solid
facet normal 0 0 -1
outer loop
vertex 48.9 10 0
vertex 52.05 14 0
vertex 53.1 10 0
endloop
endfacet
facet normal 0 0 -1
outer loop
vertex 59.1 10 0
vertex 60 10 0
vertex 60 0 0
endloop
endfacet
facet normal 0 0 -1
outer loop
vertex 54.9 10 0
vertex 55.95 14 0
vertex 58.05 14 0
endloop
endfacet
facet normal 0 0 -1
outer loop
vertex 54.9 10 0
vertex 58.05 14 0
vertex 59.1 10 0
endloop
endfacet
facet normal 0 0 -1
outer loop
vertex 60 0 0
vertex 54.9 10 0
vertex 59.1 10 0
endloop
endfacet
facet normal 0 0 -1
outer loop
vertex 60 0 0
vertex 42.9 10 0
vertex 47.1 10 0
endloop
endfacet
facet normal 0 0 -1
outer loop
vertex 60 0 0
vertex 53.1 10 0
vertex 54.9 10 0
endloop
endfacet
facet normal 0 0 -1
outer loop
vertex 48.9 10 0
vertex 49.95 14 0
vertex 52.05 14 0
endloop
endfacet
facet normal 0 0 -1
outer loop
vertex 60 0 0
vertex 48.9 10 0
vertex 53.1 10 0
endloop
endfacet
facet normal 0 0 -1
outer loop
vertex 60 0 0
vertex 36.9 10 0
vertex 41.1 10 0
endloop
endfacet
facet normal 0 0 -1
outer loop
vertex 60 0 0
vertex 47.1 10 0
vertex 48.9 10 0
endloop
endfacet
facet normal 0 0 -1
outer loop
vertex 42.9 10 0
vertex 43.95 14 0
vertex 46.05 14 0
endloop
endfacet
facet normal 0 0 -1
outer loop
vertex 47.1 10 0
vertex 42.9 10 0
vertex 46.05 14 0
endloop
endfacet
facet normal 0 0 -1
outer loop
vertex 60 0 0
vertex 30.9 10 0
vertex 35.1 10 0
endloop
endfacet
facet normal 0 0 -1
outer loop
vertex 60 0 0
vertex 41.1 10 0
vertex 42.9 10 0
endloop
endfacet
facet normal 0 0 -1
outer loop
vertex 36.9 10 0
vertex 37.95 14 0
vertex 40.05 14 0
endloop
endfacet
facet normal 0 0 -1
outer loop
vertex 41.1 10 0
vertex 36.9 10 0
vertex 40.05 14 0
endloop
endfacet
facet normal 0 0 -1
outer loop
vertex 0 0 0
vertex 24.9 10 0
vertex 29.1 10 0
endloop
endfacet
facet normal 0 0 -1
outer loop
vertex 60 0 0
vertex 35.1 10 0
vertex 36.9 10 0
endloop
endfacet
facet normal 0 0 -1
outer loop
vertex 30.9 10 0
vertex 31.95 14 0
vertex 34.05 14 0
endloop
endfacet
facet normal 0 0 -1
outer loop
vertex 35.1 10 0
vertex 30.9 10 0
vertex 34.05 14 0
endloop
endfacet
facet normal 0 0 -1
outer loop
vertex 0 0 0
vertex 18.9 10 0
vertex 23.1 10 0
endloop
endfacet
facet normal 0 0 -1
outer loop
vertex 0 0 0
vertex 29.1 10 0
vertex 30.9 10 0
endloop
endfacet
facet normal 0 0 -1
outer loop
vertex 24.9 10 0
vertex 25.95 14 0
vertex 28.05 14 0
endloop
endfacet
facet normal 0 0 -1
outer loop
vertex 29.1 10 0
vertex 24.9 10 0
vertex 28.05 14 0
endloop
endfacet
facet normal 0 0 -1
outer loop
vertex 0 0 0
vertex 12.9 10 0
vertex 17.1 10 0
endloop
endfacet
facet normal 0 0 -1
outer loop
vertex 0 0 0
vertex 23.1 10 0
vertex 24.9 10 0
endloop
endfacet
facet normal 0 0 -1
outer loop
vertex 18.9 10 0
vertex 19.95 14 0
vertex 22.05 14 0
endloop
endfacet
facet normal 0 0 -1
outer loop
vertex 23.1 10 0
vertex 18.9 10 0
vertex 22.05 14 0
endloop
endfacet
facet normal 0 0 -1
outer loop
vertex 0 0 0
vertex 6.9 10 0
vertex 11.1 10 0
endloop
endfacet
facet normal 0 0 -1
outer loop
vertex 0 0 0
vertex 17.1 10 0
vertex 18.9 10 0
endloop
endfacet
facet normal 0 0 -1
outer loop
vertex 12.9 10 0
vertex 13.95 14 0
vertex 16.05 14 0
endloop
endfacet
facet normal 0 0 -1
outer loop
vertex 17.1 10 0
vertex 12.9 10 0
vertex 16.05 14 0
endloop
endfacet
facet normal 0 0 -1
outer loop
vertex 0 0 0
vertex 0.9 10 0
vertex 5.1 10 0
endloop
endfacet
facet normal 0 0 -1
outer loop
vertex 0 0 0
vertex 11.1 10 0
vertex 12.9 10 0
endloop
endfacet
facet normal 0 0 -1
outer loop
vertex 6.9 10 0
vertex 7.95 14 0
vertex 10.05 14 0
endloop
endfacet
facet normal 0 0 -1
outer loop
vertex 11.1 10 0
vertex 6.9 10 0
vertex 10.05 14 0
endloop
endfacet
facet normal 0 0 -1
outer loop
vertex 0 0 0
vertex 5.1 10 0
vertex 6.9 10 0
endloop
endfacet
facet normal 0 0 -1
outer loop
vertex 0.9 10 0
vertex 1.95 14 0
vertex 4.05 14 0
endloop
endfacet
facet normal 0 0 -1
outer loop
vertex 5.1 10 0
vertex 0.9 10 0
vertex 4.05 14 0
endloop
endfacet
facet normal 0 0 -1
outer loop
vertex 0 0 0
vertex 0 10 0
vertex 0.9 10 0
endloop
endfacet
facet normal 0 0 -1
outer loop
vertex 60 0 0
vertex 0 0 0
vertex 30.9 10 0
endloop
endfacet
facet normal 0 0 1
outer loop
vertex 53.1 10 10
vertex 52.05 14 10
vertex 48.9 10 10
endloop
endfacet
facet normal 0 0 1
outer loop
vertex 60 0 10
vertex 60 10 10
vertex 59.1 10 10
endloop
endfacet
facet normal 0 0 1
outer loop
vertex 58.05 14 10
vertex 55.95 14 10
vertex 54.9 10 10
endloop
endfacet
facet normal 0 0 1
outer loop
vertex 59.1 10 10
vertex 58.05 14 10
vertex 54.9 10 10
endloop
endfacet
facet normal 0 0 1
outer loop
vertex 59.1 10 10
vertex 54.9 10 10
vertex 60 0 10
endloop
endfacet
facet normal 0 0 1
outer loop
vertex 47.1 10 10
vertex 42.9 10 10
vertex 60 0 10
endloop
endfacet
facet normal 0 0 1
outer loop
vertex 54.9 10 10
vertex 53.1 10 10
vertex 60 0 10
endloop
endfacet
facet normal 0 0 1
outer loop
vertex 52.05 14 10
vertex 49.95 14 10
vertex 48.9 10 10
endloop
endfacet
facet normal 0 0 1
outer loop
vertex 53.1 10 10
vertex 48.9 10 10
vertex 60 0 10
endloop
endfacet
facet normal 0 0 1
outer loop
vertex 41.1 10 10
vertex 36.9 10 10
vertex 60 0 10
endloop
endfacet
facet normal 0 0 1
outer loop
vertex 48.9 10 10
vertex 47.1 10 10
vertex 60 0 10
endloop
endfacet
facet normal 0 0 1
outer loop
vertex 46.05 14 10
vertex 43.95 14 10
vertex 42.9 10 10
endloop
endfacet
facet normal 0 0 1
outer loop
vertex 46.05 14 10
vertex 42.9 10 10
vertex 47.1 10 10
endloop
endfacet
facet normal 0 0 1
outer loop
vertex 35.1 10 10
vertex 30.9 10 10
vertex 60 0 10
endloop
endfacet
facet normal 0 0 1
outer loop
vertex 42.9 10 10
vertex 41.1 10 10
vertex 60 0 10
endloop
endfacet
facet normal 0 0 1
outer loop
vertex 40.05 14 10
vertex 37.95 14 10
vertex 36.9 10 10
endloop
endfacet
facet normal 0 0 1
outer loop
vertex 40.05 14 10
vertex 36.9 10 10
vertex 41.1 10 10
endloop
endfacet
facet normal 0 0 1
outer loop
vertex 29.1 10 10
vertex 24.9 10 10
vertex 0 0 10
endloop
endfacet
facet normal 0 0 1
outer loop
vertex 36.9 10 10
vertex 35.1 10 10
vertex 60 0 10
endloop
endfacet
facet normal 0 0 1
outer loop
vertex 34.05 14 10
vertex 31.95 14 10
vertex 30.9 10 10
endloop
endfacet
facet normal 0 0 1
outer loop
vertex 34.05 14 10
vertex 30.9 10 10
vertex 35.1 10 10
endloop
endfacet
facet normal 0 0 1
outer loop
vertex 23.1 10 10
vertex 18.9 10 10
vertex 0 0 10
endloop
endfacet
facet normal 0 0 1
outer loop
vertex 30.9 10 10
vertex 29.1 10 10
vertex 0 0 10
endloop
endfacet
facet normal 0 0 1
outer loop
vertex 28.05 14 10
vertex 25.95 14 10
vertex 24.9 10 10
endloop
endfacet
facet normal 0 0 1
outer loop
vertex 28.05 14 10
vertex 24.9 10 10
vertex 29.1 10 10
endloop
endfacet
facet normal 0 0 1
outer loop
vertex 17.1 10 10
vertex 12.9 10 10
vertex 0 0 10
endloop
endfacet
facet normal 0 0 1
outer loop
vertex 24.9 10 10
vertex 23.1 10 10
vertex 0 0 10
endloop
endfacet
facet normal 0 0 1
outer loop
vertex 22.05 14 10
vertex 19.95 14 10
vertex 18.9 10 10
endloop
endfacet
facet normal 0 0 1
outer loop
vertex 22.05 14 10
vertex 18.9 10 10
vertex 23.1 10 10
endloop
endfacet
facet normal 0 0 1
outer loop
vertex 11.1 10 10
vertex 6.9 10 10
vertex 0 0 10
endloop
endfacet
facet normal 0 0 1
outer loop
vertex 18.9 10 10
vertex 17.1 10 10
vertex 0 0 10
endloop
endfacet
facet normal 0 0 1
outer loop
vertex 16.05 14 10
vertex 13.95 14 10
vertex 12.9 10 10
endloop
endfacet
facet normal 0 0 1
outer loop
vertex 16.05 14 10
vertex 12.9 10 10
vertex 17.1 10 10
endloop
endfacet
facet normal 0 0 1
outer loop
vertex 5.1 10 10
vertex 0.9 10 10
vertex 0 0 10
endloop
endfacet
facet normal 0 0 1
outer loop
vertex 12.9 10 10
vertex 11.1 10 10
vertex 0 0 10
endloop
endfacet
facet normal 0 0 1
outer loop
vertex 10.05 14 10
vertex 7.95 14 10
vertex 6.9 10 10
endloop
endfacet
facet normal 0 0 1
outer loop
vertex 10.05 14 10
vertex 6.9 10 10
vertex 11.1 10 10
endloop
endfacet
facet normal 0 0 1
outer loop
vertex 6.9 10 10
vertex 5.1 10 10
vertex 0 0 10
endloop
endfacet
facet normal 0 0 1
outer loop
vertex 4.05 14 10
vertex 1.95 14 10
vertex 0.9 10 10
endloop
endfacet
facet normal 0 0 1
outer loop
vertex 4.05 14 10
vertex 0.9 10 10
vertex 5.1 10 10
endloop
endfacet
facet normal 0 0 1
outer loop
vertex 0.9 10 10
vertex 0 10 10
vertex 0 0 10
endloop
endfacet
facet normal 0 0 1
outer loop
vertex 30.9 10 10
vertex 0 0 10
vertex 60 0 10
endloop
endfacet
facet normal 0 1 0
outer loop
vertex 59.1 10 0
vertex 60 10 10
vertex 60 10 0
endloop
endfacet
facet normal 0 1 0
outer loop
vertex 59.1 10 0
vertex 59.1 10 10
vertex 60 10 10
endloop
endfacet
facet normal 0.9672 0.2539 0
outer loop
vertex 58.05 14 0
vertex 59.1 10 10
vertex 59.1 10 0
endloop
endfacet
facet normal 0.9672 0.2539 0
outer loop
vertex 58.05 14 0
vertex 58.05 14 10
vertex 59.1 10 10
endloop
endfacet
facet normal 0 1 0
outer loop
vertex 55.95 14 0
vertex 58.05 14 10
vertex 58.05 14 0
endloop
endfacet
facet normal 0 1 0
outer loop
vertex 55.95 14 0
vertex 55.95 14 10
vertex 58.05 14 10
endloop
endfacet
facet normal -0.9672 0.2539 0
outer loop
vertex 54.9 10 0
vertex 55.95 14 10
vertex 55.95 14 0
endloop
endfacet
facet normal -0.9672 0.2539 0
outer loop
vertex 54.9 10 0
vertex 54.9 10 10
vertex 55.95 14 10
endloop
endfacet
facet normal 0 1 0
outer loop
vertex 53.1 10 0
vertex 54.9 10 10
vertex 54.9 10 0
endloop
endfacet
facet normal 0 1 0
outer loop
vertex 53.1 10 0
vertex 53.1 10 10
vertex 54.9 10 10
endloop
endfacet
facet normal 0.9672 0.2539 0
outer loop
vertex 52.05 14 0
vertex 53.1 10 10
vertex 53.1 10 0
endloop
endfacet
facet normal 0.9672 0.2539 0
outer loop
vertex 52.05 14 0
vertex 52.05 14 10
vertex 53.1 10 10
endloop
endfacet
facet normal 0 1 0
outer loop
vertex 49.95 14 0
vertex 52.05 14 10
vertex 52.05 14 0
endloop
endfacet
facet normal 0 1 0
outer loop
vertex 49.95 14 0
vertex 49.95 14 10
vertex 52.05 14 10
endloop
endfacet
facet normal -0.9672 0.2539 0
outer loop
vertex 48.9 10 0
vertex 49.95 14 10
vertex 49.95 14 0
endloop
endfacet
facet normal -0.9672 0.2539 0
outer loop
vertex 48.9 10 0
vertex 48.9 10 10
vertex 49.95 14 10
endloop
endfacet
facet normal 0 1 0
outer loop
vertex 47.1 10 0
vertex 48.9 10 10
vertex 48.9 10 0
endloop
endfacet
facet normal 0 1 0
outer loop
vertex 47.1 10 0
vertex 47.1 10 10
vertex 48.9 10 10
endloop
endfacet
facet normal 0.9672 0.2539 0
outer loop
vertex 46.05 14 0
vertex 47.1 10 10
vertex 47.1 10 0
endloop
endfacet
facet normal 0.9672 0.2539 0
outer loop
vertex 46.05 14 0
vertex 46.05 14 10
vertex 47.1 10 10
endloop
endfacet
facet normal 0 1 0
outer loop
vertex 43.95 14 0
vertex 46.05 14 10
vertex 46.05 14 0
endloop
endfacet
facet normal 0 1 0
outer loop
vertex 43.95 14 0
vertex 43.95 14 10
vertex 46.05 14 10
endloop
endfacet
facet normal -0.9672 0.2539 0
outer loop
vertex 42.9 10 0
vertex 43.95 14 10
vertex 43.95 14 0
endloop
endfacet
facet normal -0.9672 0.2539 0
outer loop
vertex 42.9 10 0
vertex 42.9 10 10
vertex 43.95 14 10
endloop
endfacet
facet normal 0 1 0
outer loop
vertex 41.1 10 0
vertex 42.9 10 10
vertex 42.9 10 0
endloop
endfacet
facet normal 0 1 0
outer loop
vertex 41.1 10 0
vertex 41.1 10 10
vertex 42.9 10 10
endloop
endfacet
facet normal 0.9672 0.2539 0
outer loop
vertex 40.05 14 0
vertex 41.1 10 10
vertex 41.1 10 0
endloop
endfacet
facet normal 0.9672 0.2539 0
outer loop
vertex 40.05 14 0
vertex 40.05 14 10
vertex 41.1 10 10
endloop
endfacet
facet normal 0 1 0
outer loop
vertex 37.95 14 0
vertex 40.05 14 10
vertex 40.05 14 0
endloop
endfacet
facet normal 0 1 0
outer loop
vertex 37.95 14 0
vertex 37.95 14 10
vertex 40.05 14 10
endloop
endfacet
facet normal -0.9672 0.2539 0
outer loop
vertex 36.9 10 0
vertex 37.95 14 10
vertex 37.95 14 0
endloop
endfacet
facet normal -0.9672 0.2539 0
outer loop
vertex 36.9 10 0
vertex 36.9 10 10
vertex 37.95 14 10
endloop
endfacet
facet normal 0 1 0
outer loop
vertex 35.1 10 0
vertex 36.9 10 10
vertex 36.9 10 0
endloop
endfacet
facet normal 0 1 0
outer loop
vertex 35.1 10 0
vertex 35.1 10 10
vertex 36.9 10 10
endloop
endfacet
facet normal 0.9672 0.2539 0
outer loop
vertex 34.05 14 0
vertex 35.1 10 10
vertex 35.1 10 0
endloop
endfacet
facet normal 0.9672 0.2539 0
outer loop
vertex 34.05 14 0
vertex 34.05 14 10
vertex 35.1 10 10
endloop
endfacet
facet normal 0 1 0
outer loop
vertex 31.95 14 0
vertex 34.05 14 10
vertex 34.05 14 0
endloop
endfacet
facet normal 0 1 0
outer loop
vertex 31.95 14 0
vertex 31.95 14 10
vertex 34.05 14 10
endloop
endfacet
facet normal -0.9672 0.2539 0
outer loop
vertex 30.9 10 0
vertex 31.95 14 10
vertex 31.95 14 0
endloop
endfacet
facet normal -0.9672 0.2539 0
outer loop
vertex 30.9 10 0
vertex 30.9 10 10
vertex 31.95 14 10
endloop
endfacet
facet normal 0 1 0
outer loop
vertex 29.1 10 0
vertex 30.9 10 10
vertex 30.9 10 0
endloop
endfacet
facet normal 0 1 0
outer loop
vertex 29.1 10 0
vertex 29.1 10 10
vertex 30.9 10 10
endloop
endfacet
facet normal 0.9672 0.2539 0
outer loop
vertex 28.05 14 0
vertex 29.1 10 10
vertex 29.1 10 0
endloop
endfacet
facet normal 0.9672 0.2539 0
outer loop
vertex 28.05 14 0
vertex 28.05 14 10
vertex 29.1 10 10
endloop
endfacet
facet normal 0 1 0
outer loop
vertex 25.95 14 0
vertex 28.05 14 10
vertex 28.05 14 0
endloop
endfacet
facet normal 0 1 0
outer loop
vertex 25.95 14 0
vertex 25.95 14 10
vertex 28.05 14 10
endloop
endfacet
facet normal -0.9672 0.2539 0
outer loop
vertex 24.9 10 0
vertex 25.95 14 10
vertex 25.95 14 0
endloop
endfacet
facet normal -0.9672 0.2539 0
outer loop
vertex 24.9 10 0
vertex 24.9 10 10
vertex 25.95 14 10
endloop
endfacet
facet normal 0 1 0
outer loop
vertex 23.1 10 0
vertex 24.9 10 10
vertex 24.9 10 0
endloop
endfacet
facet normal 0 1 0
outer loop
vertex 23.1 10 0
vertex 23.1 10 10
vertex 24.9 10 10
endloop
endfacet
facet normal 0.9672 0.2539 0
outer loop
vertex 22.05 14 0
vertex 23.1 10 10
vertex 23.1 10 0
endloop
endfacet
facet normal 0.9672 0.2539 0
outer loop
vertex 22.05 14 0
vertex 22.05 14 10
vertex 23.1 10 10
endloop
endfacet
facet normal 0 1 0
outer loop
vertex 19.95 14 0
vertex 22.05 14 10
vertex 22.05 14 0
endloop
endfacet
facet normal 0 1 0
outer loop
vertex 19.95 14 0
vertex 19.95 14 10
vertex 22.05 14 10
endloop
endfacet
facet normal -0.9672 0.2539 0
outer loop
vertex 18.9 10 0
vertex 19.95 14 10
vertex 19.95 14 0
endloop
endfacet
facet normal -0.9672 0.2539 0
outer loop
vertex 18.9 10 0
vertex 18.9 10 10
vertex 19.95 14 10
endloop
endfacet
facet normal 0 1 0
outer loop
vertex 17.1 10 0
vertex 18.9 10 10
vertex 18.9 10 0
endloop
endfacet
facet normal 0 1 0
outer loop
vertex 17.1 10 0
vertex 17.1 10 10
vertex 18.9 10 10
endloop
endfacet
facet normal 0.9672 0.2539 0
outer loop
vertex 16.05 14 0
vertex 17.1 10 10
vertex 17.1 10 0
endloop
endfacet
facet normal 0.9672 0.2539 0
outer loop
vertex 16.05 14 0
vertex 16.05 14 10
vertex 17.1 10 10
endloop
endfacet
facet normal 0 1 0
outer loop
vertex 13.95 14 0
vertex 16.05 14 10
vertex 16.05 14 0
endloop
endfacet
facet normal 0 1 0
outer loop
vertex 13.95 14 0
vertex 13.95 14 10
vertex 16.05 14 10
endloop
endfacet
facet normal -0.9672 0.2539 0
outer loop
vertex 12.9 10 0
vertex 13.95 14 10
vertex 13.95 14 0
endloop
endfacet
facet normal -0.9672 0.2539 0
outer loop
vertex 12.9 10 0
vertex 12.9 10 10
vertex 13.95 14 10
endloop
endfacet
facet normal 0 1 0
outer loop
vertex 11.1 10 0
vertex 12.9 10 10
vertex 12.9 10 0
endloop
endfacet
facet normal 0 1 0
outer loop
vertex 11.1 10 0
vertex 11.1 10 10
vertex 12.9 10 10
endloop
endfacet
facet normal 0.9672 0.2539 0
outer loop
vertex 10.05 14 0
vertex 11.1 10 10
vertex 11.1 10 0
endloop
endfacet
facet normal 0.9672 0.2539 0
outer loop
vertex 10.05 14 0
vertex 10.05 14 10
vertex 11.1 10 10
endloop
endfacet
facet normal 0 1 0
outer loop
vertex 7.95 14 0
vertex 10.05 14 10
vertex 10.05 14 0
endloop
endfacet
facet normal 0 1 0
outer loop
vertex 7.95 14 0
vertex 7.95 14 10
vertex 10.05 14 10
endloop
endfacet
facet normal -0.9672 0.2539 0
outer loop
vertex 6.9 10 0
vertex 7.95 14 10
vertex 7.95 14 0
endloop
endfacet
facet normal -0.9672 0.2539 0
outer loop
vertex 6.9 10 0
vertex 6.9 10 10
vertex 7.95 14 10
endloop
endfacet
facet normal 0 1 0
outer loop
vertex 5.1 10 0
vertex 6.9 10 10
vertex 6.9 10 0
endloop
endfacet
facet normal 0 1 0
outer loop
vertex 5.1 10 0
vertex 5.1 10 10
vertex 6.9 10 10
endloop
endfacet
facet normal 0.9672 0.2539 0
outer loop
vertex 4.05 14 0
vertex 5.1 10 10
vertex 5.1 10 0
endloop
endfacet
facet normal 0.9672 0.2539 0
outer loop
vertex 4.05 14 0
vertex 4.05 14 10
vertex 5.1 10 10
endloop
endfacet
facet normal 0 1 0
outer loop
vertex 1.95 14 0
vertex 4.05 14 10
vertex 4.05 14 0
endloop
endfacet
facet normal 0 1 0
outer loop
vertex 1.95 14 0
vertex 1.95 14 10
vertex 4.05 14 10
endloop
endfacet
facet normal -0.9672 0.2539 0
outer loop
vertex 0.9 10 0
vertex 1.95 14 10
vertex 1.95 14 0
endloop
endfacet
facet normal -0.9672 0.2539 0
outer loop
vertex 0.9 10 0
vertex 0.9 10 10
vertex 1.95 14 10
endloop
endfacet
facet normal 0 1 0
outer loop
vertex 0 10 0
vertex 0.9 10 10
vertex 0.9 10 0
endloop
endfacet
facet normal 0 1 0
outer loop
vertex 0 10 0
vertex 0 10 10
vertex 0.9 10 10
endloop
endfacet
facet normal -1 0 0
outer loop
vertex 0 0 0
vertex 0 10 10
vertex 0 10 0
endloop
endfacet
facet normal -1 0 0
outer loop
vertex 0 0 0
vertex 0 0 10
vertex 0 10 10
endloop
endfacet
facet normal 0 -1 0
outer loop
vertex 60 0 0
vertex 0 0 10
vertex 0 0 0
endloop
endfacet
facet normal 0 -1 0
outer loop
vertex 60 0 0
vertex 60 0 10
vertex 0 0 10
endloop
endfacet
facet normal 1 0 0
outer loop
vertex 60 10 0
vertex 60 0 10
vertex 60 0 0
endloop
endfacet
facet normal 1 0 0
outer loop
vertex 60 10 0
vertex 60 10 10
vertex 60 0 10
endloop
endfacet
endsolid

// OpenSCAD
$fn = 32;

// ----------------------------------------------------------------------
// Gear rack: 10 teeth, pitch 6 mm
// ----------------------------------------------------------------------

// --- parameters (mm) ---
teeth = 10;               // number of teeth
pitch = 6;                // tooth pitch, X
root_w = 4.2;             // tooth width at the root
tip_w = 2.1;              // tooth width at the tip
base_h = 10;              // rack body height, Y
tooth_h = 4;              // tooth height above the body
plate_t = 10;             // rack width, Z (extrusion height)

rack_l = teeth * pitch;  // overall length
total_h = base_h + tooth_h;  // overall height

profile = [[0, 0], [60, 0], [60, 10], [59.1, 10], [58.05, 14], [55.95, 14], [54.9, 10], [53.1, 10], [52.05, 14], [49.95, 14], [48.9, 10], [47.1, 10], [46.05, 14], [43.95, 14], [42.9, 10], [41.1, 10], [40.05, 14], [37.95, 14], [36.9, 10], [35.1, 10], [34.05, 14], [31.95, 14], [30.9, 10], [29.1, 10], [28.05, 14], [25.95, 14], [24.9, 10], [23.1, 10], [22.05, 14], [19.95, 14], [18.9, 10], [17.1, 10], [16.05, 14], [13.95, 14], [12.9, 10], [11.1, 10], [10.05, 14], [7.95, 14], [6.9, 10], [5.1, 10], [4.05, 14], [1.95, 14], [0.9, 10], [0, 10]];  // primary outline, 44 points, counter clockwise

// --- the one profile operation ---
linear_extrude(height = plate_t) polygon(points = profile);
